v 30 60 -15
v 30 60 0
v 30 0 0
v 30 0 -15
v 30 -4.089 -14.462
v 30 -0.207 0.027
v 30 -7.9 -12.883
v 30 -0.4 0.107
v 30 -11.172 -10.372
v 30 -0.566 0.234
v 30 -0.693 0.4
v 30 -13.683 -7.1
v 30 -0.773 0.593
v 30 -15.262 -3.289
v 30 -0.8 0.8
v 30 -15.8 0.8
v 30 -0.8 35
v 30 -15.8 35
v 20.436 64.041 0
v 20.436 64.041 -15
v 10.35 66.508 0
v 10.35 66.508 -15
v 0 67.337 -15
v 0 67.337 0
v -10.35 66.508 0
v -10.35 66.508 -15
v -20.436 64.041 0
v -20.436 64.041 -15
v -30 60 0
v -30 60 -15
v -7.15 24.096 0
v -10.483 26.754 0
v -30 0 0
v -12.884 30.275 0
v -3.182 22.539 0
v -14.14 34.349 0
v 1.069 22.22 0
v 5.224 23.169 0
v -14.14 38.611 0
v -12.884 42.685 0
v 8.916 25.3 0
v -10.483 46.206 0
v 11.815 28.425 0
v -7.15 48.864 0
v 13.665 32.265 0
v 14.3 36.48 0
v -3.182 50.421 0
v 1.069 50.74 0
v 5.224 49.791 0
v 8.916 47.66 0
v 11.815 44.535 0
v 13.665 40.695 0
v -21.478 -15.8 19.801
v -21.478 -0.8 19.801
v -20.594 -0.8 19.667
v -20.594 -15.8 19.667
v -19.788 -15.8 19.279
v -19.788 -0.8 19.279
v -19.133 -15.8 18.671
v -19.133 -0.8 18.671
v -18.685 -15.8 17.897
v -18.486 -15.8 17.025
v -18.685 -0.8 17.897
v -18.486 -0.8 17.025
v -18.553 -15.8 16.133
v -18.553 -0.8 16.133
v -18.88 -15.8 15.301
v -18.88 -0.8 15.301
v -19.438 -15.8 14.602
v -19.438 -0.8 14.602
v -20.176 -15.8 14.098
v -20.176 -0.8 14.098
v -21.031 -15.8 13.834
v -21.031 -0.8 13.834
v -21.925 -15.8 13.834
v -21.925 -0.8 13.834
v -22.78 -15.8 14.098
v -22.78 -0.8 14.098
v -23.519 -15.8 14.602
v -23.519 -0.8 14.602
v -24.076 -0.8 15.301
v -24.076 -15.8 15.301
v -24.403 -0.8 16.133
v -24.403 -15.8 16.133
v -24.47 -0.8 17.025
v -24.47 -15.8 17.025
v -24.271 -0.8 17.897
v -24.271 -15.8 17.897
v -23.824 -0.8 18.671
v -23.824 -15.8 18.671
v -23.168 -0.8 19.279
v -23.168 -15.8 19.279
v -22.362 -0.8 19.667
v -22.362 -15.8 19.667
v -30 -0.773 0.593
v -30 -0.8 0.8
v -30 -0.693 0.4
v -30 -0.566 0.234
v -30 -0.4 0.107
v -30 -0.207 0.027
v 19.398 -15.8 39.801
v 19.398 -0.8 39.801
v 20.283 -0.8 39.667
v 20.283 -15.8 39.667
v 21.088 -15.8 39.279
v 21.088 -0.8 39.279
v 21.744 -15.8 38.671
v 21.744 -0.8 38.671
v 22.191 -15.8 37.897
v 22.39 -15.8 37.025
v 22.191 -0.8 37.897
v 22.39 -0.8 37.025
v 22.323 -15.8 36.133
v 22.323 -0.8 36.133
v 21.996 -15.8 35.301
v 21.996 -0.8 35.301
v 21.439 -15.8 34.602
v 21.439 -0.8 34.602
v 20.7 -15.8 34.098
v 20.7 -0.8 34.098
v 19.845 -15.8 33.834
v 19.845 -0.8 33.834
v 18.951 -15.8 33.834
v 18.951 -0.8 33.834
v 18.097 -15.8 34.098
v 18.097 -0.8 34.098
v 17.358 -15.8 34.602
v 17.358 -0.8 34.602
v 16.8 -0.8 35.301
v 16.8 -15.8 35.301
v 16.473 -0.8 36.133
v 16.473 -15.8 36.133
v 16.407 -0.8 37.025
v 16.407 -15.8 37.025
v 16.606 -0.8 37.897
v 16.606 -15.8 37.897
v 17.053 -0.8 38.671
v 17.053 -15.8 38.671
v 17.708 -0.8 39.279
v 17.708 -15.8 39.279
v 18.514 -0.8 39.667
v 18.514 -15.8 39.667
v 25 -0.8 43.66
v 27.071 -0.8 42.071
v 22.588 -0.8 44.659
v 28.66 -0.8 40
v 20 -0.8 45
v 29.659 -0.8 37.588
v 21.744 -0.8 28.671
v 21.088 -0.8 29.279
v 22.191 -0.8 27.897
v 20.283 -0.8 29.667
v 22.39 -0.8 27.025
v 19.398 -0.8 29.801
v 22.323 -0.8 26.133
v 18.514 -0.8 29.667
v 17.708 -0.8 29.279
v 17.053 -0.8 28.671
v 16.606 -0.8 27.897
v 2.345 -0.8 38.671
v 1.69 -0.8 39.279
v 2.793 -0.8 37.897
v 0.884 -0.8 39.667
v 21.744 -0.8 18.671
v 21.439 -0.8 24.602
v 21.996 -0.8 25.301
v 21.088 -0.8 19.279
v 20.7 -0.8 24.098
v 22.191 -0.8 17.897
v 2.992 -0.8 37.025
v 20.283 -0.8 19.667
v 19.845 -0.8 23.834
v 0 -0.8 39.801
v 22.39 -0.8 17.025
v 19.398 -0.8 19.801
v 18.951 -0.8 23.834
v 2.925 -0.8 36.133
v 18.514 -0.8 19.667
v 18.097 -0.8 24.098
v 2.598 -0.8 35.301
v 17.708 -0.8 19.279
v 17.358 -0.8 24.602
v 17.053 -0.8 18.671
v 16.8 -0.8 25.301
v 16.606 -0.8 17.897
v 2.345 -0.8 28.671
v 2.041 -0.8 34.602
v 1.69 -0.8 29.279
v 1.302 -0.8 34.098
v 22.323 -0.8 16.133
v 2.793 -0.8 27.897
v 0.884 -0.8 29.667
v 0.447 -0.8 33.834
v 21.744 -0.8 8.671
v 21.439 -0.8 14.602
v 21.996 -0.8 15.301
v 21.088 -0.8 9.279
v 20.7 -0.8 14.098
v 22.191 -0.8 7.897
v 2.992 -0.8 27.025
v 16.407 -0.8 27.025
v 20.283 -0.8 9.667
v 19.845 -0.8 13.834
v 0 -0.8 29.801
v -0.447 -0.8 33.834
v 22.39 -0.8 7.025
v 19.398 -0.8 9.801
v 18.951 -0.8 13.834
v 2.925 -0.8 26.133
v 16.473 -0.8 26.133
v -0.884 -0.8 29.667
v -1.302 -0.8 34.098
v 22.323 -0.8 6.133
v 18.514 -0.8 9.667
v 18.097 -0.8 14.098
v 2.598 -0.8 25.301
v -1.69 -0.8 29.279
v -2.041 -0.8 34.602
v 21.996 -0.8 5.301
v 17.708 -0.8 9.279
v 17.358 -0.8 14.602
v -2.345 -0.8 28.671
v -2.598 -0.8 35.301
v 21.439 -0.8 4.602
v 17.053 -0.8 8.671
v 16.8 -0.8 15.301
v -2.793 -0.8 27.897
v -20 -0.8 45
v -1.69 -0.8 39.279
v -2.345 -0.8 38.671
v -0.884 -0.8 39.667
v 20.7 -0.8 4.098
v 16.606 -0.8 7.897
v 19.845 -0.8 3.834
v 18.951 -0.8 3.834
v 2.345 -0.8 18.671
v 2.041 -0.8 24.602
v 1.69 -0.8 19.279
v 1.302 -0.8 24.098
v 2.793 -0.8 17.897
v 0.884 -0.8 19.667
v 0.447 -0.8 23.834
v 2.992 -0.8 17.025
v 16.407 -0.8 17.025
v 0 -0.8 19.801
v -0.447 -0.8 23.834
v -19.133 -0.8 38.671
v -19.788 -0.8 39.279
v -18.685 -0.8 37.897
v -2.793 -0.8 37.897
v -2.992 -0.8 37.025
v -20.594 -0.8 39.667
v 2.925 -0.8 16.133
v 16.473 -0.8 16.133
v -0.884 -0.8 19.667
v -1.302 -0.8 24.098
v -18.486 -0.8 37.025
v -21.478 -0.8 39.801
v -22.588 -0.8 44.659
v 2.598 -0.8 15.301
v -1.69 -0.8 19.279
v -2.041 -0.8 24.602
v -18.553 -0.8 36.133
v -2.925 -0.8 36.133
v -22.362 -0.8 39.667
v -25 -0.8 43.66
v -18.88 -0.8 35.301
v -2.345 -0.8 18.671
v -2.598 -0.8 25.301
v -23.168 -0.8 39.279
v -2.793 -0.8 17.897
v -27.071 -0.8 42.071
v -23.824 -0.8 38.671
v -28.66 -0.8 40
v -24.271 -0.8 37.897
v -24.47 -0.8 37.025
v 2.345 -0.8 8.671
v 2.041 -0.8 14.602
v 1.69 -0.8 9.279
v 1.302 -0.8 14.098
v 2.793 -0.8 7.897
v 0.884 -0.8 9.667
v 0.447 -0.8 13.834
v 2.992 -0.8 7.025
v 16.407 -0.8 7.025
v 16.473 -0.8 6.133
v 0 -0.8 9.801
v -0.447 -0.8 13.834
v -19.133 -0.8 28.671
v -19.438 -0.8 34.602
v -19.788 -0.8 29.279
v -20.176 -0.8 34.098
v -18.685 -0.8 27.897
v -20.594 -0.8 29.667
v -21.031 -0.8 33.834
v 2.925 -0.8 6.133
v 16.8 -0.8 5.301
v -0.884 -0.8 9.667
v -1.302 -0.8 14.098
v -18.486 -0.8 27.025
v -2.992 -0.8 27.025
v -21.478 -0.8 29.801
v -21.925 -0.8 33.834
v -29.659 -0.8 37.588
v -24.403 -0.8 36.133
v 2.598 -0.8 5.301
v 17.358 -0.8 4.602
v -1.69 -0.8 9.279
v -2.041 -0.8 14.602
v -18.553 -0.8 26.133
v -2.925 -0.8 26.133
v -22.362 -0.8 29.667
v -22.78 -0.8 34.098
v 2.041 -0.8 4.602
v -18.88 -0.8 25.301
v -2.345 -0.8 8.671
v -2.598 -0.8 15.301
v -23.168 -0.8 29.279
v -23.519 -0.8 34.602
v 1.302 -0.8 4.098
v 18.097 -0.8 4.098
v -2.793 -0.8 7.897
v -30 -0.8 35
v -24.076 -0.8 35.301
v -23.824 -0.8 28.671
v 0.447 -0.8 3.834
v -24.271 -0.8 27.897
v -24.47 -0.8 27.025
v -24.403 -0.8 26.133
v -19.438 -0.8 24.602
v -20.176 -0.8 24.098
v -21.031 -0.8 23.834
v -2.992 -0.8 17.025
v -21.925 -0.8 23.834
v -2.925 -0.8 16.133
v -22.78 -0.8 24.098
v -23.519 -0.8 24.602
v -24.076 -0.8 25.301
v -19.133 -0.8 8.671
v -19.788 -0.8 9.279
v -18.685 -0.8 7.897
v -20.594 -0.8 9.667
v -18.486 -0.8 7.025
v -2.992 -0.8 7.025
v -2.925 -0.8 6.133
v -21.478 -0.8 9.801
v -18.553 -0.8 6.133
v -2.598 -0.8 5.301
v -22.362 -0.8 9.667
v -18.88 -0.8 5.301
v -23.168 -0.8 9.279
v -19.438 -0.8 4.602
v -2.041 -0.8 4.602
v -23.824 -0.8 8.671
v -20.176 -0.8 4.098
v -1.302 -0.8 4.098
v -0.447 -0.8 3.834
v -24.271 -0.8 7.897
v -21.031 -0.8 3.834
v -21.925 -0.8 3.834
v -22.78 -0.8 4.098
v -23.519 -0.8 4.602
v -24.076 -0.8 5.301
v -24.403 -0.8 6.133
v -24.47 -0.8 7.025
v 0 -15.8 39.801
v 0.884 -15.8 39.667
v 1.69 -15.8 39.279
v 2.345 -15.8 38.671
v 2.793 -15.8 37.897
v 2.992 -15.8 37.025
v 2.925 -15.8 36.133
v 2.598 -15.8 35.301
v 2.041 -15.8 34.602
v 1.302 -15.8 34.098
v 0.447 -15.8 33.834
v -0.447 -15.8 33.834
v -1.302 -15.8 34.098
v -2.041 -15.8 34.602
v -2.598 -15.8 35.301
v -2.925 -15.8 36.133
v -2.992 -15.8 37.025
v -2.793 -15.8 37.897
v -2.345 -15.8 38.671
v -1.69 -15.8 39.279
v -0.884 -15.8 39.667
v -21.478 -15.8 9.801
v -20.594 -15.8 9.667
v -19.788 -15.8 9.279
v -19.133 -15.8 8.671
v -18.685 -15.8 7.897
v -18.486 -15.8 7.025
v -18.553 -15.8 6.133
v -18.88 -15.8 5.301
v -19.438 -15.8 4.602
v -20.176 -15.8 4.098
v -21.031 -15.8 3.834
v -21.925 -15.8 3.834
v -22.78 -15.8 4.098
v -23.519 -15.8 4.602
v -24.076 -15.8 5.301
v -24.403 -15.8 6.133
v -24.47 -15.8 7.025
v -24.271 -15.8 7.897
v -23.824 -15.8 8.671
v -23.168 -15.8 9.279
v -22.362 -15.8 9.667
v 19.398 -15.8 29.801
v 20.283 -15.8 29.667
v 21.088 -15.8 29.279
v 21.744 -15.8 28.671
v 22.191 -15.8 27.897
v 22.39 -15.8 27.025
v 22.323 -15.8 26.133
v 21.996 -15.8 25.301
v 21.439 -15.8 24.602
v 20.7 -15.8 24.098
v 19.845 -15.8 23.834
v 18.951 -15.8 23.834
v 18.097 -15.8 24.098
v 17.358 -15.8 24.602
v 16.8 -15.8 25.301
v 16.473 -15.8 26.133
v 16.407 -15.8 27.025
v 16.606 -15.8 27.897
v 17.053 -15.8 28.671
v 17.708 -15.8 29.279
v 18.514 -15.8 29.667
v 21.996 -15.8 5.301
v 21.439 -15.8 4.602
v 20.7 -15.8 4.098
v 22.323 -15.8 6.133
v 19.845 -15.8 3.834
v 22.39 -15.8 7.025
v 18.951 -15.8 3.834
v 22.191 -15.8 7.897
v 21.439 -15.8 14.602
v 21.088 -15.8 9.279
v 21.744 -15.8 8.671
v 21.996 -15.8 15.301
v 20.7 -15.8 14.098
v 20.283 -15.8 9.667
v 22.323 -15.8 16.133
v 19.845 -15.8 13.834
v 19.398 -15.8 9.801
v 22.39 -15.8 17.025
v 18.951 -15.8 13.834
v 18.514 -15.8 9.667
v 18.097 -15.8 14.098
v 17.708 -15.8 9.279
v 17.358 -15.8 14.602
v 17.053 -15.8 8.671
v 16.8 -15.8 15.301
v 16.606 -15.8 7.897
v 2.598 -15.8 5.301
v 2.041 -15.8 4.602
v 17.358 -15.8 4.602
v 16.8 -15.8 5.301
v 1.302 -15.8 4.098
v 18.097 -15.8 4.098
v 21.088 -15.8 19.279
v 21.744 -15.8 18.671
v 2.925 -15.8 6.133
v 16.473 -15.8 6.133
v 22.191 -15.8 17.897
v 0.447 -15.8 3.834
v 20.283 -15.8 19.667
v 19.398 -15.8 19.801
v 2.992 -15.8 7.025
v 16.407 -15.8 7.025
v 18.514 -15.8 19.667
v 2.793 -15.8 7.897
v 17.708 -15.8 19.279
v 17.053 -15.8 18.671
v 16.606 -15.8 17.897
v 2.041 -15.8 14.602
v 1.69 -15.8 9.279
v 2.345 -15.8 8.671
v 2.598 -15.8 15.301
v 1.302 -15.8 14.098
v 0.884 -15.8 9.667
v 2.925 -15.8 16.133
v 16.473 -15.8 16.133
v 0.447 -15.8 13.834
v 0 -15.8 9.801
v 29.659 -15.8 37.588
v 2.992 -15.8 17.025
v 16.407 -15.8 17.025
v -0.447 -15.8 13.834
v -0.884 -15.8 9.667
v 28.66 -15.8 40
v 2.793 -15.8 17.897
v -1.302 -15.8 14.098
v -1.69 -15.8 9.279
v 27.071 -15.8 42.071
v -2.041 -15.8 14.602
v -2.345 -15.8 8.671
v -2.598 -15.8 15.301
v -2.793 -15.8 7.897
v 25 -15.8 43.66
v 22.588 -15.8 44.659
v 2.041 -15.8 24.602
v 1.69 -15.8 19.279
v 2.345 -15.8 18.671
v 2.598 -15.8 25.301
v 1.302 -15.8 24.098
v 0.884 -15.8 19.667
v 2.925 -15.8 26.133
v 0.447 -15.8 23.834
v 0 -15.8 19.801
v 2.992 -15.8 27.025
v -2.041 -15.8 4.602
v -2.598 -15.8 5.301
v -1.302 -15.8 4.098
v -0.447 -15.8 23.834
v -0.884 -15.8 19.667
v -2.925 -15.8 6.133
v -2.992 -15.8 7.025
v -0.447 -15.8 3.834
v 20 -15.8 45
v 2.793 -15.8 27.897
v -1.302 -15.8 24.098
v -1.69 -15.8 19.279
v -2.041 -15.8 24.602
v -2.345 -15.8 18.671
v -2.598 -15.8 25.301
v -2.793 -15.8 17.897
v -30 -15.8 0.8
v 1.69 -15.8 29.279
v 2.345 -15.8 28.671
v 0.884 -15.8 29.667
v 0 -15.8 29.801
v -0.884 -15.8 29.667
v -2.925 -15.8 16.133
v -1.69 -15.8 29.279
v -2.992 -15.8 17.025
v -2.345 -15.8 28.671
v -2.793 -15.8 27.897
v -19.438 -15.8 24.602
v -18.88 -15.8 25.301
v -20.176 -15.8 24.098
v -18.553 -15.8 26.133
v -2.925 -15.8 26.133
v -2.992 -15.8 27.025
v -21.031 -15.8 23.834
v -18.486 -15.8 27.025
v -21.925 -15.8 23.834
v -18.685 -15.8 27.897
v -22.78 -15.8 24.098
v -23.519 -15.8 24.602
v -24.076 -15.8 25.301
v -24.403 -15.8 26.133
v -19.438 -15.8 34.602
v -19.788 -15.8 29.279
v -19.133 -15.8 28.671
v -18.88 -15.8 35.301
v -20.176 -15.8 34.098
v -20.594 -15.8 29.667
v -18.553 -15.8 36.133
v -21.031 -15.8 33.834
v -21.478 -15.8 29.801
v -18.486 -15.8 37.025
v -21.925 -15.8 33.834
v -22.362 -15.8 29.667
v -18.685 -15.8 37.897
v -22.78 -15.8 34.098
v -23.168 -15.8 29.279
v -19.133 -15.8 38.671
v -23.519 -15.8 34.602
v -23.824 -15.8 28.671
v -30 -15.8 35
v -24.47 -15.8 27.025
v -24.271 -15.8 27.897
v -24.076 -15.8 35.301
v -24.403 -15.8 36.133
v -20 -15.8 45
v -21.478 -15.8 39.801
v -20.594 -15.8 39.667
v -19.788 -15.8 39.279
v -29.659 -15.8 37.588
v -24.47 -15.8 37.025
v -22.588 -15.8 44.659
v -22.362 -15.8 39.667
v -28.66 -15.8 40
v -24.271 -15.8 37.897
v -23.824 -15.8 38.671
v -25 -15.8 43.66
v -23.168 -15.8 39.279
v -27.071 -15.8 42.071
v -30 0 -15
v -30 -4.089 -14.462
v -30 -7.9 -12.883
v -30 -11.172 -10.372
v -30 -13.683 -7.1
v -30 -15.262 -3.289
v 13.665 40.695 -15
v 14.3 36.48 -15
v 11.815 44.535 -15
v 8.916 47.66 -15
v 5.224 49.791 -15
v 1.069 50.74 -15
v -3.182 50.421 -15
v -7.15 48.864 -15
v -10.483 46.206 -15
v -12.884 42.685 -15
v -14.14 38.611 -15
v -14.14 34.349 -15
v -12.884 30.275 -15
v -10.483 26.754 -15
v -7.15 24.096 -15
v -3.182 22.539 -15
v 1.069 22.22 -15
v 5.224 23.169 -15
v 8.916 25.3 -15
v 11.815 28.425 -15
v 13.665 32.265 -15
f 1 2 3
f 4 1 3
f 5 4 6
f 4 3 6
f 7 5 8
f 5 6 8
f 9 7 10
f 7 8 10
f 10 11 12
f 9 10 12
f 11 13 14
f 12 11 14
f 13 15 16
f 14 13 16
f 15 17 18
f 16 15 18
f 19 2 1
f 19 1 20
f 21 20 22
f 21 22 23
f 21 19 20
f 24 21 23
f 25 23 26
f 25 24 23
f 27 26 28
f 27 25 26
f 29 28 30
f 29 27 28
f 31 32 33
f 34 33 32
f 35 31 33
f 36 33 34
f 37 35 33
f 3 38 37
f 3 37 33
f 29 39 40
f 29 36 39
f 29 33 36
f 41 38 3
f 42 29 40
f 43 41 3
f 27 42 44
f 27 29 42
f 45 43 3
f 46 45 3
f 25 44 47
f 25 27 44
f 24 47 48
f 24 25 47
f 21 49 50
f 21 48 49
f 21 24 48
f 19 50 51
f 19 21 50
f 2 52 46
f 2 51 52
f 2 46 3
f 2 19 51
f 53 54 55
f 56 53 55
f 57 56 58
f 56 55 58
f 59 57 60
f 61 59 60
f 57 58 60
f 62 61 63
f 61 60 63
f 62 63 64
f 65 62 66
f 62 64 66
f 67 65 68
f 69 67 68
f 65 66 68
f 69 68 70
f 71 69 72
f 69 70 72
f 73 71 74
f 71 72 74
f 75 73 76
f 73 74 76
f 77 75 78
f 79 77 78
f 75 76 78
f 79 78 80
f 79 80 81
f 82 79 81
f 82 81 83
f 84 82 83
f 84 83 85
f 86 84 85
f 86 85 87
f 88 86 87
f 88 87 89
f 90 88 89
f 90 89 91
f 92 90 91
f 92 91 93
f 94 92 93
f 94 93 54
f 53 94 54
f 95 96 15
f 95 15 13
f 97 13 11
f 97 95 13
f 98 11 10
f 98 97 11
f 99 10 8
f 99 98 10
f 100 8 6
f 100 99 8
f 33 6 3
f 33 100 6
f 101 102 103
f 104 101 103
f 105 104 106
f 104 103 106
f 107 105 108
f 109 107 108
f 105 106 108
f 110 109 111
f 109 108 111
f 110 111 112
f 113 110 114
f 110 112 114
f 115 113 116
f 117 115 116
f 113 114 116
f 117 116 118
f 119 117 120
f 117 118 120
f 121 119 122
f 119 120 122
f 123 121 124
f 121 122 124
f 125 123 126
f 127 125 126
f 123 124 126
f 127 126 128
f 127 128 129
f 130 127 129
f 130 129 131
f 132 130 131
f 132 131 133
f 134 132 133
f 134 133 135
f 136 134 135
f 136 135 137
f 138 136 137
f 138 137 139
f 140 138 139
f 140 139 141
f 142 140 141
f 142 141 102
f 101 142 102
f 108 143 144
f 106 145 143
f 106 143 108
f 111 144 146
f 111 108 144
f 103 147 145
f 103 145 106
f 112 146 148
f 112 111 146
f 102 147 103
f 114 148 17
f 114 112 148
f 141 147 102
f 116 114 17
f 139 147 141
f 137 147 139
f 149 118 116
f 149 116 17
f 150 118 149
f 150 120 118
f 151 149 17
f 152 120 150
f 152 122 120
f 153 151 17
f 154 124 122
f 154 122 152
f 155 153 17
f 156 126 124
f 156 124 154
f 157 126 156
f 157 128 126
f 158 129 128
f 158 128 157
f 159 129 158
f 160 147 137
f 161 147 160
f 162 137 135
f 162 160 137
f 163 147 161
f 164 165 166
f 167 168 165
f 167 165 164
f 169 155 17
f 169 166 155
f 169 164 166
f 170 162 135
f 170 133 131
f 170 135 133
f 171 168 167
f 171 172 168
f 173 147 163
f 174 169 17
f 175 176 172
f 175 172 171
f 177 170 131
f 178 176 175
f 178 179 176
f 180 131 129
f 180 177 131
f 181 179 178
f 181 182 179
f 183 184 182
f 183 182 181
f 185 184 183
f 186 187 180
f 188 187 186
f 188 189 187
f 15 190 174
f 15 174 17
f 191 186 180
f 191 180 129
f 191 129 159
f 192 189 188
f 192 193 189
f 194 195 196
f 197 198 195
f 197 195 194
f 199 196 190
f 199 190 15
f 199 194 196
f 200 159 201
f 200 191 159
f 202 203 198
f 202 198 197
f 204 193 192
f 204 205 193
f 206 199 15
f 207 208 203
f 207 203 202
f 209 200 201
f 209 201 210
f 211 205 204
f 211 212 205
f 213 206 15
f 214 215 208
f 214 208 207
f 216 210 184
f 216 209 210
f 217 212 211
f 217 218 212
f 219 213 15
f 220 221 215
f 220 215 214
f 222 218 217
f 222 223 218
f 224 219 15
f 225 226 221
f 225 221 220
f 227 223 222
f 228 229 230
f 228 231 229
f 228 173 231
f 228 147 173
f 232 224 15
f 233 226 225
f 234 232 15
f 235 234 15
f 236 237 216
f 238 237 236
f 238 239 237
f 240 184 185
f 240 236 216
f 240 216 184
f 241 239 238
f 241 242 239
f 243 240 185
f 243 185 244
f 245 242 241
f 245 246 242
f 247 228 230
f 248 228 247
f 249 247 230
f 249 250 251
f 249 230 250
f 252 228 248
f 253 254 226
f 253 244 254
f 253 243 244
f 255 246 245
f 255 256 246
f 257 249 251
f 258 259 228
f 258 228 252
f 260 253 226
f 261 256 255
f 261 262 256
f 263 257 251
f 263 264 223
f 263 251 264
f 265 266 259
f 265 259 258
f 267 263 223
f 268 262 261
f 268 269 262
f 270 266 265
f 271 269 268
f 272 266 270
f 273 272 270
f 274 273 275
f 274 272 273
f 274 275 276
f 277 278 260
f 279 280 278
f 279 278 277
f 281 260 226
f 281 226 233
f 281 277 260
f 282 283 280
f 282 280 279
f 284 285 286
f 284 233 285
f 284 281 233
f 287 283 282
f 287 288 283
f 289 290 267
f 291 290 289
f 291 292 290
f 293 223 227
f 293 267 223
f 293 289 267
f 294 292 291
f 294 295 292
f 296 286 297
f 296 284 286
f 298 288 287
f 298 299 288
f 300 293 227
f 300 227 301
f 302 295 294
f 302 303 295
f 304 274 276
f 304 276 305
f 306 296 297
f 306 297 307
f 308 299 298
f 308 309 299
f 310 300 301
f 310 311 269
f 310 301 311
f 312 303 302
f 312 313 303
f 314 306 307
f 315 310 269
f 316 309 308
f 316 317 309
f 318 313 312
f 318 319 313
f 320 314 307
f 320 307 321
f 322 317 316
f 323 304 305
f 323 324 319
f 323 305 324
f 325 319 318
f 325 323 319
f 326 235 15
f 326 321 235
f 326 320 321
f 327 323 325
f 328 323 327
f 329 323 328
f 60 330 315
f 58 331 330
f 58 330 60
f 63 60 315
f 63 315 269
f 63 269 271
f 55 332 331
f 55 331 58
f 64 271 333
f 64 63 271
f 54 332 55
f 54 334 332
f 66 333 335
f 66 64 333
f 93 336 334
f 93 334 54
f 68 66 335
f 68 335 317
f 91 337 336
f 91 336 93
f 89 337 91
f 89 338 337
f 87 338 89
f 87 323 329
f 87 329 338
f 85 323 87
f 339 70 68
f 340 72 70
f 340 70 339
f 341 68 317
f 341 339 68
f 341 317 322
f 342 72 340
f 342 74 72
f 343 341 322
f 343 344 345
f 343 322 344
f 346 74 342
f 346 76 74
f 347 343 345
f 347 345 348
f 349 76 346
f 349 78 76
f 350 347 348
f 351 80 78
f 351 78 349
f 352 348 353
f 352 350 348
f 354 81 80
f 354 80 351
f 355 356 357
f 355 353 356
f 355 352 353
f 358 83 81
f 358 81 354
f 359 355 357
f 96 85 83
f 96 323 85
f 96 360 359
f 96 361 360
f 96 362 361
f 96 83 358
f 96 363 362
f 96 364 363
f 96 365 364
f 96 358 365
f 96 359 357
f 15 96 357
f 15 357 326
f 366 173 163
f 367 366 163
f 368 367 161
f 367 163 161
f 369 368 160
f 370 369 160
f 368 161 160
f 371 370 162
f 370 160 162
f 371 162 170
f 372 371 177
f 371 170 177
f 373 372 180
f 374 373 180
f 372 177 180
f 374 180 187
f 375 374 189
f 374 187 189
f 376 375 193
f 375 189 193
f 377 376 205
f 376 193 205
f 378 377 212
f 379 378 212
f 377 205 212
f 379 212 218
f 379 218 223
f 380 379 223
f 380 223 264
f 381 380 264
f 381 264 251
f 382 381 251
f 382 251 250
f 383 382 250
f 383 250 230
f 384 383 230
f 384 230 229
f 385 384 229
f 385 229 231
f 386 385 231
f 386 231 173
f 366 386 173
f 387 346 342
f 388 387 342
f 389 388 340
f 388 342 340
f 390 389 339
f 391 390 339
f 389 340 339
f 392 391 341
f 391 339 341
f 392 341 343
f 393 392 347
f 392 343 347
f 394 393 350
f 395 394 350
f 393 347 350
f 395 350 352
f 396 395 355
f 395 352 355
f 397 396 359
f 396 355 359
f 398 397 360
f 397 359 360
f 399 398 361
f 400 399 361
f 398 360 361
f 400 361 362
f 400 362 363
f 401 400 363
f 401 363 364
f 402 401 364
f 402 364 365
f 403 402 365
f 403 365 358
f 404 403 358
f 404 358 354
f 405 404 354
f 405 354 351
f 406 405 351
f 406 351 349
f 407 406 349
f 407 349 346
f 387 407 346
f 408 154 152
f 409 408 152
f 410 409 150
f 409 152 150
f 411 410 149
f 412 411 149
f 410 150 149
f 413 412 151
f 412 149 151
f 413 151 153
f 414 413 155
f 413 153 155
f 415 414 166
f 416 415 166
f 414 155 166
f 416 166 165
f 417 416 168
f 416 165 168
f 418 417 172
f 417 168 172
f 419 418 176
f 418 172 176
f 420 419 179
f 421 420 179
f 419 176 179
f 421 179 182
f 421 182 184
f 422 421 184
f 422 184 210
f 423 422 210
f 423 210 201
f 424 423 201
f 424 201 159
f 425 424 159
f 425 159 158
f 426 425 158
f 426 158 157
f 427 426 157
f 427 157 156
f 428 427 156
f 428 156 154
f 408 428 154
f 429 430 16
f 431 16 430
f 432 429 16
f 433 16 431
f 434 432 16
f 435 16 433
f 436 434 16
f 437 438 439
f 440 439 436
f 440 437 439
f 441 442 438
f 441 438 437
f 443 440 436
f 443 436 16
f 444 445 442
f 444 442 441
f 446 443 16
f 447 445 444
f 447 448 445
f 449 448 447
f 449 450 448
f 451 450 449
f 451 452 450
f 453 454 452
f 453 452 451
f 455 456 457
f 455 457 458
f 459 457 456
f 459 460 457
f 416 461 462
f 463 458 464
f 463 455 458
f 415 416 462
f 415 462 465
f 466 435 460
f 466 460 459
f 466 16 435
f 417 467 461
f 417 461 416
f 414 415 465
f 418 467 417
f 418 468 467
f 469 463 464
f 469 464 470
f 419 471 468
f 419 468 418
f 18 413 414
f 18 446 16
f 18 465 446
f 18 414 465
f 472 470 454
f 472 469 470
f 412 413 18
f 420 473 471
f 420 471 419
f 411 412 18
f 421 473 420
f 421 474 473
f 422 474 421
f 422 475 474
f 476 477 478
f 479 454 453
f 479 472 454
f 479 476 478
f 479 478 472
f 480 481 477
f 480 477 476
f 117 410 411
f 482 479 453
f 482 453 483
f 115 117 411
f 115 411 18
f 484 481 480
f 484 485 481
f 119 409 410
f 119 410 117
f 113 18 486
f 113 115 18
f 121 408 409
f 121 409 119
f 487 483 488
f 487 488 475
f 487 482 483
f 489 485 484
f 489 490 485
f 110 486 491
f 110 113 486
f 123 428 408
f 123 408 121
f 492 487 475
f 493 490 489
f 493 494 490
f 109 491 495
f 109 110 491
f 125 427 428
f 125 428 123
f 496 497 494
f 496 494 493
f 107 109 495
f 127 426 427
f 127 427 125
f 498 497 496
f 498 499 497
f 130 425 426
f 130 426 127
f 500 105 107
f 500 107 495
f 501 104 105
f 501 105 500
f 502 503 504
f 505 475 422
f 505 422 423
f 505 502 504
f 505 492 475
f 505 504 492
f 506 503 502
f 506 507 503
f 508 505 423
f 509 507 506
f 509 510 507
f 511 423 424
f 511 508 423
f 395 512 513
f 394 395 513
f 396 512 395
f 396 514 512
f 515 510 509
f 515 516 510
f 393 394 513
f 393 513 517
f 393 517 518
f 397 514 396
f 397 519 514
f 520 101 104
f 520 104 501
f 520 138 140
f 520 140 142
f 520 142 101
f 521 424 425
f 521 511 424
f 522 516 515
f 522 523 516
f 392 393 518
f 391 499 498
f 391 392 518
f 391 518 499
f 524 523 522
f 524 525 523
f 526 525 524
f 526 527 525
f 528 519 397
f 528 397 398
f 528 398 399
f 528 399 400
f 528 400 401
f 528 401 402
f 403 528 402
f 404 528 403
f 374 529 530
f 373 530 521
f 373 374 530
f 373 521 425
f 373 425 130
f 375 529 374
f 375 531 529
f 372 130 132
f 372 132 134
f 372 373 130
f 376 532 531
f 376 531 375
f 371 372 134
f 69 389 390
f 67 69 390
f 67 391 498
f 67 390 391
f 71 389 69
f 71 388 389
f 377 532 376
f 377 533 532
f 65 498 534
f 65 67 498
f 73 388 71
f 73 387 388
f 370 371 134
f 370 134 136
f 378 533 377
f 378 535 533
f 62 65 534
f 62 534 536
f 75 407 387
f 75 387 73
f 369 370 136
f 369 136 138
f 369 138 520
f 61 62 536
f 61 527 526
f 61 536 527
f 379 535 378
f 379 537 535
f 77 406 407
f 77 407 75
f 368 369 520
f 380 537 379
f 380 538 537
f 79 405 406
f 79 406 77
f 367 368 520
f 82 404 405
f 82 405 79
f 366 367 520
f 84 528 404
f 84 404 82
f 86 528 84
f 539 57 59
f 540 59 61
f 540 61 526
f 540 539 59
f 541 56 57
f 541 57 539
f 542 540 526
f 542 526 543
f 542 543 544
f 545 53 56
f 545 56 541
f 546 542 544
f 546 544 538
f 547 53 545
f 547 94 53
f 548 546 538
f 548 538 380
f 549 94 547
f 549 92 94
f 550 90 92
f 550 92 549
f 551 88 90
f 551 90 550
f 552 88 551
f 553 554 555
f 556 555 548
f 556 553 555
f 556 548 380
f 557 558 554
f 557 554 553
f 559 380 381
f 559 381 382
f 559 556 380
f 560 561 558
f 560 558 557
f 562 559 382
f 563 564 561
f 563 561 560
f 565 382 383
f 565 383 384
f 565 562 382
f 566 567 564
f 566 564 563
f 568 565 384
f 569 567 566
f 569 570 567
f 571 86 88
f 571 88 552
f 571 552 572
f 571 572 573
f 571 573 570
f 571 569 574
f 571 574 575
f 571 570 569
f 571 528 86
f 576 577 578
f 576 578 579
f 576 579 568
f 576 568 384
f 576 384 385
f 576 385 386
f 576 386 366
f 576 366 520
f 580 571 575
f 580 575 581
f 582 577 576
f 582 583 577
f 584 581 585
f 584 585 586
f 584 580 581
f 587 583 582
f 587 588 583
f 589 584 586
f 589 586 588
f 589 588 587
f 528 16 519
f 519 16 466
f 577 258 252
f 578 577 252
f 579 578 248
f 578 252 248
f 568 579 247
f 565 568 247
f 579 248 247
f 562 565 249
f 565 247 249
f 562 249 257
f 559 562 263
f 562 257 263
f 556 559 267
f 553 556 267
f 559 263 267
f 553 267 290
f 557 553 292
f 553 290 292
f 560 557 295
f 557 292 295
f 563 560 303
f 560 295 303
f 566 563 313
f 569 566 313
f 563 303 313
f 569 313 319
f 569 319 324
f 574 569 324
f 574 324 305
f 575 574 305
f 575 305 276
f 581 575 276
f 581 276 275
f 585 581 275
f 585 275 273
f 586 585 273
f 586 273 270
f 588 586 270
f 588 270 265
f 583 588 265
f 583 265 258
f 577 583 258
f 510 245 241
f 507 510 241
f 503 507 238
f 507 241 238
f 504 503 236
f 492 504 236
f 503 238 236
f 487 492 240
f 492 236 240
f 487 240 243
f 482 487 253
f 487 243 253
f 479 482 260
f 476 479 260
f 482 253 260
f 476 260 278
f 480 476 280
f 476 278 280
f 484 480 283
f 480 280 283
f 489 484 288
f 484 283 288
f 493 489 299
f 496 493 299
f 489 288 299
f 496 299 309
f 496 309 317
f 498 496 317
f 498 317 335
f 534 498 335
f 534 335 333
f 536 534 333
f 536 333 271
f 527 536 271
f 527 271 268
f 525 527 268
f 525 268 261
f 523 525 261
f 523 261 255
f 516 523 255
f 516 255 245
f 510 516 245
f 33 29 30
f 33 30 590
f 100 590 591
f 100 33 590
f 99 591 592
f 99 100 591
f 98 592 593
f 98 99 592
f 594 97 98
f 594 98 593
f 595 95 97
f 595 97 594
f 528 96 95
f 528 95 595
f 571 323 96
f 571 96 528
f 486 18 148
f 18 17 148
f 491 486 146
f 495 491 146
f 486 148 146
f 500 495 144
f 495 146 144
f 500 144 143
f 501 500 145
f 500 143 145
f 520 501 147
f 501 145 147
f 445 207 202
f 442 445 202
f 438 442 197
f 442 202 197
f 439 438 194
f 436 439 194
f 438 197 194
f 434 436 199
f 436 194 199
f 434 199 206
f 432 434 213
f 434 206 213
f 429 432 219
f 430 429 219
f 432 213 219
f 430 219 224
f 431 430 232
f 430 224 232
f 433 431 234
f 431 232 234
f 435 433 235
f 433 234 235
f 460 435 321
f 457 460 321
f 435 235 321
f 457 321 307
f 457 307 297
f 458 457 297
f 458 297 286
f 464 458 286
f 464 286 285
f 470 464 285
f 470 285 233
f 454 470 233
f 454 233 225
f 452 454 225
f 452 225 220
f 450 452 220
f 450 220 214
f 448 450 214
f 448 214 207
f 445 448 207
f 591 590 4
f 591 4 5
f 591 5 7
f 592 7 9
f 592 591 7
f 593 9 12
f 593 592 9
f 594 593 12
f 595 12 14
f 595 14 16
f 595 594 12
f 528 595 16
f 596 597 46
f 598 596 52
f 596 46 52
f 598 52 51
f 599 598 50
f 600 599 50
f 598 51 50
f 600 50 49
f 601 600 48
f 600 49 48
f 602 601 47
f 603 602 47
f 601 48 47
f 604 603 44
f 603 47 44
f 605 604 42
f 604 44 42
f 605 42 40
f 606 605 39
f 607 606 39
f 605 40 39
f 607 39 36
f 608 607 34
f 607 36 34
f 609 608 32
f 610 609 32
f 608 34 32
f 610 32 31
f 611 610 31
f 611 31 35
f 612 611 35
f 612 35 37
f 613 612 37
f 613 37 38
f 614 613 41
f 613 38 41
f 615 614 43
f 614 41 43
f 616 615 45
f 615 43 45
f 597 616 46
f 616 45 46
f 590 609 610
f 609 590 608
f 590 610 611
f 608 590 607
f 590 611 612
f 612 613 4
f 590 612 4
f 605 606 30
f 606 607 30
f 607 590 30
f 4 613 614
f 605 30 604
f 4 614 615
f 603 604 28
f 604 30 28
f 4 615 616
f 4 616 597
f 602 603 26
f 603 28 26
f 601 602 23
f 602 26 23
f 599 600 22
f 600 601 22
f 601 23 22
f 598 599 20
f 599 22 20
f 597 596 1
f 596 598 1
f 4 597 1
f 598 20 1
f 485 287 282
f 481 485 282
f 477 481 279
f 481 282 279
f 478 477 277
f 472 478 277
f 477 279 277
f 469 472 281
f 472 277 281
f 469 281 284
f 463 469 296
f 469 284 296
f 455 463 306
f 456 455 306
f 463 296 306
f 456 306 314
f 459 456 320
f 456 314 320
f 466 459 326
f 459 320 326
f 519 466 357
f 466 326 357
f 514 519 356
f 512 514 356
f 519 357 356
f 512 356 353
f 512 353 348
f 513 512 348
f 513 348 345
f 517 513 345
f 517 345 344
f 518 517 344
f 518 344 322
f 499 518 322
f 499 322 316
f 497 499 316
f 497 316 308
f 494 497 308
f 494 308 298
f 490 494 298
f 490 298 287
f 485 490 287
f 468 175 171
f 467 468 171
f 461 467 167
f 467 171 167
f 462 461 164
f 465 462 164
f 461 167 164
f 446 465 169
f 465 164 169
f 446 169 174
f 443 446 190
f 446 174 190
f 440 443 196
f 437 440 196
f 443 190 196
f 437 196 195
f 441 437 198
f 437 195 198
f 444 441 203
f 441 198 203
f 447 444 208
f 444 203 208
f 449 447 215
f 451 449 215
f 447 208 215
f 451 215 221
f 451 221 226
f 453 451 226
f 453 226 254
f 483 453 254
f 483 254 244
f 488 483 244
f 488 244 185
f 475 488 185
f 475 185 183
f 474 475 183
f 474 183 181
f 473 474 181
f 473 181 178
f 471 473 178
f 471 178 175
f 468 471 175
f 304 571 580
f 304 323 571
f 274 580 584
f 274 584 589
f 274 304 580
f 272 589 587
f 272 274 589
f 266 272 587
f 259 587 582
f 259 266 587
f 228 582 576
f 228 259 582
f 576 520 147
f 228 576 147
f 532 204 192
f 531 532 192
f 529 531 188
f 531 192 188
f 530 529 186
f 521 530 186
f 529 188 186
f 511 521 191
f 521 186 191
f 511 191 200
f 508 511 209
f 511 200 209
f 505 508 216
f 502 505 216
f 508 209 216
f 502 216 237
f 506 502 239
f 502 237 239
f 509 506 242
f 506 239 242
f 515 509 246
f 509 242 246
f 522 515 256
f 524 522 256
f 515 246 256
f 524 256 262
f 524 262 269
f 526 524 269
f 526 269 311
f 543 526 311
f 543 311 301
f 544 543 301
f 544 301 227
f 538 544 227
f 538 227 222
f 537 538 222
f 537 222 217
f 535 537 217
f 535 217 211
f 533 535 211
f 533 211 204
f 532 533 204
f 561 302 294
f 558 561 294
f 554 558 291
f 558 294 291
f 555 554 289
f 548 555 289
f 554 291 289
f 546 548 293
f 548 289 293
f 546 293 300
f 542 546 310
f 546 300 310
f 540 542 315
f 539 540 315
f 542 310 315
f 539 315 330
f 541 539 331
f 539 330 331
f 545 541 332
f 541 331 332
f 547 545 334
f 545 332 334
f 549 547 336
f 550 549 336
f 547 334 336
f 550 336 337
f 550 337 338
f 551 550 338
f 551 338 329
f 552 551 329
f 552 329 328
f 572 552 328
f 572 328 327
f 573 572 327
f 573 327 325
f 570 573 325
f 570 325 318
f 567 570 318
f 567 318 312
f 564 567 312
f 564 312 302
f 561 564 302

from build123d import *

# Parameters (mm, degrees)
SKETCH1_R          = 14.3
BASE_FLANGE1_DEPTH = 15
EDGE_FLANGE1_DEPTH = 60
SKETCH9_R          = 3
CUT_EXTRUDE1_DEPTH = 50
FILLET1_R          = 10


# Sheet-metal steps are written as plain solids
with BuildPart() as part:
    # Sketch1 → Base-Flange1 (new body)
    with BuildSketch(Plane.XY):
        with BuildLine():
            Line((-30, 0), (30, 0))
            Line((30, 0), (30, 60))
            ThreePointArc((30, 60), (0, 67.337187027), (-30, 60))
            Line((-30, 60), (-30, 0))
        make_face()
        with Locations((0, 36.48)):
            Circle(SKETCH1_R, mode=Mode.SUBTRACT)
    extrude(amount=-BASE_FLANGE1_DEPTH)

    # Edge-Flange1 section (across the edge) → Edge-Flange1 (add)
    with BuildSketch(Plane(origin=(-30, -0.8, 0), x_dir=(0, 1, 0), z_dir=(1, 0, 0))):
        with BuildLine():
            Line((-15, 0.8), (-15, 45))
            Line((-15, 45), (0, 45))
            Line((0, 45), (0, 0.8))
            ThreePointArc((0, 0.8), (0.234314575, 0.234314575), (0.8, 0))
            Line((0.8, 0), (0.8, -15))
            ThreePointArc((0.8, -15), (-10.372287143, -10.372287143), (-15, 0.8))
        make_face()
    extrude(amount=EDGE_FLANGE1_DEPTH)

    # Sketch9 → Cut-Extrude1 (cut)
    with BuildSketch(Plane(origin=(0, -0.8, 0), x_dir=(1, 0, 0), z_dir=(0, 1, 0))):
        with Locations(Location((-21.478093951, -6.800727635, 0), (0, 0, 270))):
            Circle(SKETCH9_R)
        with Locations(Location((19.398278521, -6.800727635, 0), (0, 0, 270))):
            Circle(SKETCH9_R)
        with Locations(Location((0, -6.800727635, 0), (0, 0, 270))):
            Circle(SKETCH9_R)
        with Locations(Location((-21.478093951, -16.800727635, 0), (0, 0, 270))):
            Circle(SKETCH9_R)
        with Locations(Location((-21.478093951, -26.800727635, 0), (0, 0, 270))):
            Circle(SKETCH9_R)
        with Locations(Location((-21.478093951, -36.800727635, 0), (0, 0, 270))):
            Circle(SKETCH9_R)
        with Locations(Location((0, -16.800727635, 0), (0, 0, 270))):
            Circle(SKETCH9_R)
        with Locations(Location((0, -26.800727635, 0), (0, 0, 270))):
            Circle(SKETCH9_R)
        with Locations(Location((0, -36.800727635, 0), (0, 0, 270))):
            Circle(SKETCH9_R)
        with Locations(Location((19.398278521, -16.800727635, 0), (0, 0, 270))):
            Circle(SKETCH9_R)
        with Locations(Location((19.398278521, -26.800727635, 0), (0, 0, 270))):
            Circle(SKETCH9_R)
        with Locations(Location((19.398278521, -36.800727635, 0), (0, 0, 270))):
            Circle(SKETCH9_R)
    extrude(amount=-CUT_EXTRUDE1_DEPTH, mode=Mode.SUBTRACT)

    # Fillet1
    fillet1_edges = [part.edges().sort_by_distance(p)[0] for p in [
        (-30, -8.3, 45),
        (30, -8.3, 45),
    ]]
    fillet(fillet1_edges, radius=FILLET1_R)


solid = part.part
